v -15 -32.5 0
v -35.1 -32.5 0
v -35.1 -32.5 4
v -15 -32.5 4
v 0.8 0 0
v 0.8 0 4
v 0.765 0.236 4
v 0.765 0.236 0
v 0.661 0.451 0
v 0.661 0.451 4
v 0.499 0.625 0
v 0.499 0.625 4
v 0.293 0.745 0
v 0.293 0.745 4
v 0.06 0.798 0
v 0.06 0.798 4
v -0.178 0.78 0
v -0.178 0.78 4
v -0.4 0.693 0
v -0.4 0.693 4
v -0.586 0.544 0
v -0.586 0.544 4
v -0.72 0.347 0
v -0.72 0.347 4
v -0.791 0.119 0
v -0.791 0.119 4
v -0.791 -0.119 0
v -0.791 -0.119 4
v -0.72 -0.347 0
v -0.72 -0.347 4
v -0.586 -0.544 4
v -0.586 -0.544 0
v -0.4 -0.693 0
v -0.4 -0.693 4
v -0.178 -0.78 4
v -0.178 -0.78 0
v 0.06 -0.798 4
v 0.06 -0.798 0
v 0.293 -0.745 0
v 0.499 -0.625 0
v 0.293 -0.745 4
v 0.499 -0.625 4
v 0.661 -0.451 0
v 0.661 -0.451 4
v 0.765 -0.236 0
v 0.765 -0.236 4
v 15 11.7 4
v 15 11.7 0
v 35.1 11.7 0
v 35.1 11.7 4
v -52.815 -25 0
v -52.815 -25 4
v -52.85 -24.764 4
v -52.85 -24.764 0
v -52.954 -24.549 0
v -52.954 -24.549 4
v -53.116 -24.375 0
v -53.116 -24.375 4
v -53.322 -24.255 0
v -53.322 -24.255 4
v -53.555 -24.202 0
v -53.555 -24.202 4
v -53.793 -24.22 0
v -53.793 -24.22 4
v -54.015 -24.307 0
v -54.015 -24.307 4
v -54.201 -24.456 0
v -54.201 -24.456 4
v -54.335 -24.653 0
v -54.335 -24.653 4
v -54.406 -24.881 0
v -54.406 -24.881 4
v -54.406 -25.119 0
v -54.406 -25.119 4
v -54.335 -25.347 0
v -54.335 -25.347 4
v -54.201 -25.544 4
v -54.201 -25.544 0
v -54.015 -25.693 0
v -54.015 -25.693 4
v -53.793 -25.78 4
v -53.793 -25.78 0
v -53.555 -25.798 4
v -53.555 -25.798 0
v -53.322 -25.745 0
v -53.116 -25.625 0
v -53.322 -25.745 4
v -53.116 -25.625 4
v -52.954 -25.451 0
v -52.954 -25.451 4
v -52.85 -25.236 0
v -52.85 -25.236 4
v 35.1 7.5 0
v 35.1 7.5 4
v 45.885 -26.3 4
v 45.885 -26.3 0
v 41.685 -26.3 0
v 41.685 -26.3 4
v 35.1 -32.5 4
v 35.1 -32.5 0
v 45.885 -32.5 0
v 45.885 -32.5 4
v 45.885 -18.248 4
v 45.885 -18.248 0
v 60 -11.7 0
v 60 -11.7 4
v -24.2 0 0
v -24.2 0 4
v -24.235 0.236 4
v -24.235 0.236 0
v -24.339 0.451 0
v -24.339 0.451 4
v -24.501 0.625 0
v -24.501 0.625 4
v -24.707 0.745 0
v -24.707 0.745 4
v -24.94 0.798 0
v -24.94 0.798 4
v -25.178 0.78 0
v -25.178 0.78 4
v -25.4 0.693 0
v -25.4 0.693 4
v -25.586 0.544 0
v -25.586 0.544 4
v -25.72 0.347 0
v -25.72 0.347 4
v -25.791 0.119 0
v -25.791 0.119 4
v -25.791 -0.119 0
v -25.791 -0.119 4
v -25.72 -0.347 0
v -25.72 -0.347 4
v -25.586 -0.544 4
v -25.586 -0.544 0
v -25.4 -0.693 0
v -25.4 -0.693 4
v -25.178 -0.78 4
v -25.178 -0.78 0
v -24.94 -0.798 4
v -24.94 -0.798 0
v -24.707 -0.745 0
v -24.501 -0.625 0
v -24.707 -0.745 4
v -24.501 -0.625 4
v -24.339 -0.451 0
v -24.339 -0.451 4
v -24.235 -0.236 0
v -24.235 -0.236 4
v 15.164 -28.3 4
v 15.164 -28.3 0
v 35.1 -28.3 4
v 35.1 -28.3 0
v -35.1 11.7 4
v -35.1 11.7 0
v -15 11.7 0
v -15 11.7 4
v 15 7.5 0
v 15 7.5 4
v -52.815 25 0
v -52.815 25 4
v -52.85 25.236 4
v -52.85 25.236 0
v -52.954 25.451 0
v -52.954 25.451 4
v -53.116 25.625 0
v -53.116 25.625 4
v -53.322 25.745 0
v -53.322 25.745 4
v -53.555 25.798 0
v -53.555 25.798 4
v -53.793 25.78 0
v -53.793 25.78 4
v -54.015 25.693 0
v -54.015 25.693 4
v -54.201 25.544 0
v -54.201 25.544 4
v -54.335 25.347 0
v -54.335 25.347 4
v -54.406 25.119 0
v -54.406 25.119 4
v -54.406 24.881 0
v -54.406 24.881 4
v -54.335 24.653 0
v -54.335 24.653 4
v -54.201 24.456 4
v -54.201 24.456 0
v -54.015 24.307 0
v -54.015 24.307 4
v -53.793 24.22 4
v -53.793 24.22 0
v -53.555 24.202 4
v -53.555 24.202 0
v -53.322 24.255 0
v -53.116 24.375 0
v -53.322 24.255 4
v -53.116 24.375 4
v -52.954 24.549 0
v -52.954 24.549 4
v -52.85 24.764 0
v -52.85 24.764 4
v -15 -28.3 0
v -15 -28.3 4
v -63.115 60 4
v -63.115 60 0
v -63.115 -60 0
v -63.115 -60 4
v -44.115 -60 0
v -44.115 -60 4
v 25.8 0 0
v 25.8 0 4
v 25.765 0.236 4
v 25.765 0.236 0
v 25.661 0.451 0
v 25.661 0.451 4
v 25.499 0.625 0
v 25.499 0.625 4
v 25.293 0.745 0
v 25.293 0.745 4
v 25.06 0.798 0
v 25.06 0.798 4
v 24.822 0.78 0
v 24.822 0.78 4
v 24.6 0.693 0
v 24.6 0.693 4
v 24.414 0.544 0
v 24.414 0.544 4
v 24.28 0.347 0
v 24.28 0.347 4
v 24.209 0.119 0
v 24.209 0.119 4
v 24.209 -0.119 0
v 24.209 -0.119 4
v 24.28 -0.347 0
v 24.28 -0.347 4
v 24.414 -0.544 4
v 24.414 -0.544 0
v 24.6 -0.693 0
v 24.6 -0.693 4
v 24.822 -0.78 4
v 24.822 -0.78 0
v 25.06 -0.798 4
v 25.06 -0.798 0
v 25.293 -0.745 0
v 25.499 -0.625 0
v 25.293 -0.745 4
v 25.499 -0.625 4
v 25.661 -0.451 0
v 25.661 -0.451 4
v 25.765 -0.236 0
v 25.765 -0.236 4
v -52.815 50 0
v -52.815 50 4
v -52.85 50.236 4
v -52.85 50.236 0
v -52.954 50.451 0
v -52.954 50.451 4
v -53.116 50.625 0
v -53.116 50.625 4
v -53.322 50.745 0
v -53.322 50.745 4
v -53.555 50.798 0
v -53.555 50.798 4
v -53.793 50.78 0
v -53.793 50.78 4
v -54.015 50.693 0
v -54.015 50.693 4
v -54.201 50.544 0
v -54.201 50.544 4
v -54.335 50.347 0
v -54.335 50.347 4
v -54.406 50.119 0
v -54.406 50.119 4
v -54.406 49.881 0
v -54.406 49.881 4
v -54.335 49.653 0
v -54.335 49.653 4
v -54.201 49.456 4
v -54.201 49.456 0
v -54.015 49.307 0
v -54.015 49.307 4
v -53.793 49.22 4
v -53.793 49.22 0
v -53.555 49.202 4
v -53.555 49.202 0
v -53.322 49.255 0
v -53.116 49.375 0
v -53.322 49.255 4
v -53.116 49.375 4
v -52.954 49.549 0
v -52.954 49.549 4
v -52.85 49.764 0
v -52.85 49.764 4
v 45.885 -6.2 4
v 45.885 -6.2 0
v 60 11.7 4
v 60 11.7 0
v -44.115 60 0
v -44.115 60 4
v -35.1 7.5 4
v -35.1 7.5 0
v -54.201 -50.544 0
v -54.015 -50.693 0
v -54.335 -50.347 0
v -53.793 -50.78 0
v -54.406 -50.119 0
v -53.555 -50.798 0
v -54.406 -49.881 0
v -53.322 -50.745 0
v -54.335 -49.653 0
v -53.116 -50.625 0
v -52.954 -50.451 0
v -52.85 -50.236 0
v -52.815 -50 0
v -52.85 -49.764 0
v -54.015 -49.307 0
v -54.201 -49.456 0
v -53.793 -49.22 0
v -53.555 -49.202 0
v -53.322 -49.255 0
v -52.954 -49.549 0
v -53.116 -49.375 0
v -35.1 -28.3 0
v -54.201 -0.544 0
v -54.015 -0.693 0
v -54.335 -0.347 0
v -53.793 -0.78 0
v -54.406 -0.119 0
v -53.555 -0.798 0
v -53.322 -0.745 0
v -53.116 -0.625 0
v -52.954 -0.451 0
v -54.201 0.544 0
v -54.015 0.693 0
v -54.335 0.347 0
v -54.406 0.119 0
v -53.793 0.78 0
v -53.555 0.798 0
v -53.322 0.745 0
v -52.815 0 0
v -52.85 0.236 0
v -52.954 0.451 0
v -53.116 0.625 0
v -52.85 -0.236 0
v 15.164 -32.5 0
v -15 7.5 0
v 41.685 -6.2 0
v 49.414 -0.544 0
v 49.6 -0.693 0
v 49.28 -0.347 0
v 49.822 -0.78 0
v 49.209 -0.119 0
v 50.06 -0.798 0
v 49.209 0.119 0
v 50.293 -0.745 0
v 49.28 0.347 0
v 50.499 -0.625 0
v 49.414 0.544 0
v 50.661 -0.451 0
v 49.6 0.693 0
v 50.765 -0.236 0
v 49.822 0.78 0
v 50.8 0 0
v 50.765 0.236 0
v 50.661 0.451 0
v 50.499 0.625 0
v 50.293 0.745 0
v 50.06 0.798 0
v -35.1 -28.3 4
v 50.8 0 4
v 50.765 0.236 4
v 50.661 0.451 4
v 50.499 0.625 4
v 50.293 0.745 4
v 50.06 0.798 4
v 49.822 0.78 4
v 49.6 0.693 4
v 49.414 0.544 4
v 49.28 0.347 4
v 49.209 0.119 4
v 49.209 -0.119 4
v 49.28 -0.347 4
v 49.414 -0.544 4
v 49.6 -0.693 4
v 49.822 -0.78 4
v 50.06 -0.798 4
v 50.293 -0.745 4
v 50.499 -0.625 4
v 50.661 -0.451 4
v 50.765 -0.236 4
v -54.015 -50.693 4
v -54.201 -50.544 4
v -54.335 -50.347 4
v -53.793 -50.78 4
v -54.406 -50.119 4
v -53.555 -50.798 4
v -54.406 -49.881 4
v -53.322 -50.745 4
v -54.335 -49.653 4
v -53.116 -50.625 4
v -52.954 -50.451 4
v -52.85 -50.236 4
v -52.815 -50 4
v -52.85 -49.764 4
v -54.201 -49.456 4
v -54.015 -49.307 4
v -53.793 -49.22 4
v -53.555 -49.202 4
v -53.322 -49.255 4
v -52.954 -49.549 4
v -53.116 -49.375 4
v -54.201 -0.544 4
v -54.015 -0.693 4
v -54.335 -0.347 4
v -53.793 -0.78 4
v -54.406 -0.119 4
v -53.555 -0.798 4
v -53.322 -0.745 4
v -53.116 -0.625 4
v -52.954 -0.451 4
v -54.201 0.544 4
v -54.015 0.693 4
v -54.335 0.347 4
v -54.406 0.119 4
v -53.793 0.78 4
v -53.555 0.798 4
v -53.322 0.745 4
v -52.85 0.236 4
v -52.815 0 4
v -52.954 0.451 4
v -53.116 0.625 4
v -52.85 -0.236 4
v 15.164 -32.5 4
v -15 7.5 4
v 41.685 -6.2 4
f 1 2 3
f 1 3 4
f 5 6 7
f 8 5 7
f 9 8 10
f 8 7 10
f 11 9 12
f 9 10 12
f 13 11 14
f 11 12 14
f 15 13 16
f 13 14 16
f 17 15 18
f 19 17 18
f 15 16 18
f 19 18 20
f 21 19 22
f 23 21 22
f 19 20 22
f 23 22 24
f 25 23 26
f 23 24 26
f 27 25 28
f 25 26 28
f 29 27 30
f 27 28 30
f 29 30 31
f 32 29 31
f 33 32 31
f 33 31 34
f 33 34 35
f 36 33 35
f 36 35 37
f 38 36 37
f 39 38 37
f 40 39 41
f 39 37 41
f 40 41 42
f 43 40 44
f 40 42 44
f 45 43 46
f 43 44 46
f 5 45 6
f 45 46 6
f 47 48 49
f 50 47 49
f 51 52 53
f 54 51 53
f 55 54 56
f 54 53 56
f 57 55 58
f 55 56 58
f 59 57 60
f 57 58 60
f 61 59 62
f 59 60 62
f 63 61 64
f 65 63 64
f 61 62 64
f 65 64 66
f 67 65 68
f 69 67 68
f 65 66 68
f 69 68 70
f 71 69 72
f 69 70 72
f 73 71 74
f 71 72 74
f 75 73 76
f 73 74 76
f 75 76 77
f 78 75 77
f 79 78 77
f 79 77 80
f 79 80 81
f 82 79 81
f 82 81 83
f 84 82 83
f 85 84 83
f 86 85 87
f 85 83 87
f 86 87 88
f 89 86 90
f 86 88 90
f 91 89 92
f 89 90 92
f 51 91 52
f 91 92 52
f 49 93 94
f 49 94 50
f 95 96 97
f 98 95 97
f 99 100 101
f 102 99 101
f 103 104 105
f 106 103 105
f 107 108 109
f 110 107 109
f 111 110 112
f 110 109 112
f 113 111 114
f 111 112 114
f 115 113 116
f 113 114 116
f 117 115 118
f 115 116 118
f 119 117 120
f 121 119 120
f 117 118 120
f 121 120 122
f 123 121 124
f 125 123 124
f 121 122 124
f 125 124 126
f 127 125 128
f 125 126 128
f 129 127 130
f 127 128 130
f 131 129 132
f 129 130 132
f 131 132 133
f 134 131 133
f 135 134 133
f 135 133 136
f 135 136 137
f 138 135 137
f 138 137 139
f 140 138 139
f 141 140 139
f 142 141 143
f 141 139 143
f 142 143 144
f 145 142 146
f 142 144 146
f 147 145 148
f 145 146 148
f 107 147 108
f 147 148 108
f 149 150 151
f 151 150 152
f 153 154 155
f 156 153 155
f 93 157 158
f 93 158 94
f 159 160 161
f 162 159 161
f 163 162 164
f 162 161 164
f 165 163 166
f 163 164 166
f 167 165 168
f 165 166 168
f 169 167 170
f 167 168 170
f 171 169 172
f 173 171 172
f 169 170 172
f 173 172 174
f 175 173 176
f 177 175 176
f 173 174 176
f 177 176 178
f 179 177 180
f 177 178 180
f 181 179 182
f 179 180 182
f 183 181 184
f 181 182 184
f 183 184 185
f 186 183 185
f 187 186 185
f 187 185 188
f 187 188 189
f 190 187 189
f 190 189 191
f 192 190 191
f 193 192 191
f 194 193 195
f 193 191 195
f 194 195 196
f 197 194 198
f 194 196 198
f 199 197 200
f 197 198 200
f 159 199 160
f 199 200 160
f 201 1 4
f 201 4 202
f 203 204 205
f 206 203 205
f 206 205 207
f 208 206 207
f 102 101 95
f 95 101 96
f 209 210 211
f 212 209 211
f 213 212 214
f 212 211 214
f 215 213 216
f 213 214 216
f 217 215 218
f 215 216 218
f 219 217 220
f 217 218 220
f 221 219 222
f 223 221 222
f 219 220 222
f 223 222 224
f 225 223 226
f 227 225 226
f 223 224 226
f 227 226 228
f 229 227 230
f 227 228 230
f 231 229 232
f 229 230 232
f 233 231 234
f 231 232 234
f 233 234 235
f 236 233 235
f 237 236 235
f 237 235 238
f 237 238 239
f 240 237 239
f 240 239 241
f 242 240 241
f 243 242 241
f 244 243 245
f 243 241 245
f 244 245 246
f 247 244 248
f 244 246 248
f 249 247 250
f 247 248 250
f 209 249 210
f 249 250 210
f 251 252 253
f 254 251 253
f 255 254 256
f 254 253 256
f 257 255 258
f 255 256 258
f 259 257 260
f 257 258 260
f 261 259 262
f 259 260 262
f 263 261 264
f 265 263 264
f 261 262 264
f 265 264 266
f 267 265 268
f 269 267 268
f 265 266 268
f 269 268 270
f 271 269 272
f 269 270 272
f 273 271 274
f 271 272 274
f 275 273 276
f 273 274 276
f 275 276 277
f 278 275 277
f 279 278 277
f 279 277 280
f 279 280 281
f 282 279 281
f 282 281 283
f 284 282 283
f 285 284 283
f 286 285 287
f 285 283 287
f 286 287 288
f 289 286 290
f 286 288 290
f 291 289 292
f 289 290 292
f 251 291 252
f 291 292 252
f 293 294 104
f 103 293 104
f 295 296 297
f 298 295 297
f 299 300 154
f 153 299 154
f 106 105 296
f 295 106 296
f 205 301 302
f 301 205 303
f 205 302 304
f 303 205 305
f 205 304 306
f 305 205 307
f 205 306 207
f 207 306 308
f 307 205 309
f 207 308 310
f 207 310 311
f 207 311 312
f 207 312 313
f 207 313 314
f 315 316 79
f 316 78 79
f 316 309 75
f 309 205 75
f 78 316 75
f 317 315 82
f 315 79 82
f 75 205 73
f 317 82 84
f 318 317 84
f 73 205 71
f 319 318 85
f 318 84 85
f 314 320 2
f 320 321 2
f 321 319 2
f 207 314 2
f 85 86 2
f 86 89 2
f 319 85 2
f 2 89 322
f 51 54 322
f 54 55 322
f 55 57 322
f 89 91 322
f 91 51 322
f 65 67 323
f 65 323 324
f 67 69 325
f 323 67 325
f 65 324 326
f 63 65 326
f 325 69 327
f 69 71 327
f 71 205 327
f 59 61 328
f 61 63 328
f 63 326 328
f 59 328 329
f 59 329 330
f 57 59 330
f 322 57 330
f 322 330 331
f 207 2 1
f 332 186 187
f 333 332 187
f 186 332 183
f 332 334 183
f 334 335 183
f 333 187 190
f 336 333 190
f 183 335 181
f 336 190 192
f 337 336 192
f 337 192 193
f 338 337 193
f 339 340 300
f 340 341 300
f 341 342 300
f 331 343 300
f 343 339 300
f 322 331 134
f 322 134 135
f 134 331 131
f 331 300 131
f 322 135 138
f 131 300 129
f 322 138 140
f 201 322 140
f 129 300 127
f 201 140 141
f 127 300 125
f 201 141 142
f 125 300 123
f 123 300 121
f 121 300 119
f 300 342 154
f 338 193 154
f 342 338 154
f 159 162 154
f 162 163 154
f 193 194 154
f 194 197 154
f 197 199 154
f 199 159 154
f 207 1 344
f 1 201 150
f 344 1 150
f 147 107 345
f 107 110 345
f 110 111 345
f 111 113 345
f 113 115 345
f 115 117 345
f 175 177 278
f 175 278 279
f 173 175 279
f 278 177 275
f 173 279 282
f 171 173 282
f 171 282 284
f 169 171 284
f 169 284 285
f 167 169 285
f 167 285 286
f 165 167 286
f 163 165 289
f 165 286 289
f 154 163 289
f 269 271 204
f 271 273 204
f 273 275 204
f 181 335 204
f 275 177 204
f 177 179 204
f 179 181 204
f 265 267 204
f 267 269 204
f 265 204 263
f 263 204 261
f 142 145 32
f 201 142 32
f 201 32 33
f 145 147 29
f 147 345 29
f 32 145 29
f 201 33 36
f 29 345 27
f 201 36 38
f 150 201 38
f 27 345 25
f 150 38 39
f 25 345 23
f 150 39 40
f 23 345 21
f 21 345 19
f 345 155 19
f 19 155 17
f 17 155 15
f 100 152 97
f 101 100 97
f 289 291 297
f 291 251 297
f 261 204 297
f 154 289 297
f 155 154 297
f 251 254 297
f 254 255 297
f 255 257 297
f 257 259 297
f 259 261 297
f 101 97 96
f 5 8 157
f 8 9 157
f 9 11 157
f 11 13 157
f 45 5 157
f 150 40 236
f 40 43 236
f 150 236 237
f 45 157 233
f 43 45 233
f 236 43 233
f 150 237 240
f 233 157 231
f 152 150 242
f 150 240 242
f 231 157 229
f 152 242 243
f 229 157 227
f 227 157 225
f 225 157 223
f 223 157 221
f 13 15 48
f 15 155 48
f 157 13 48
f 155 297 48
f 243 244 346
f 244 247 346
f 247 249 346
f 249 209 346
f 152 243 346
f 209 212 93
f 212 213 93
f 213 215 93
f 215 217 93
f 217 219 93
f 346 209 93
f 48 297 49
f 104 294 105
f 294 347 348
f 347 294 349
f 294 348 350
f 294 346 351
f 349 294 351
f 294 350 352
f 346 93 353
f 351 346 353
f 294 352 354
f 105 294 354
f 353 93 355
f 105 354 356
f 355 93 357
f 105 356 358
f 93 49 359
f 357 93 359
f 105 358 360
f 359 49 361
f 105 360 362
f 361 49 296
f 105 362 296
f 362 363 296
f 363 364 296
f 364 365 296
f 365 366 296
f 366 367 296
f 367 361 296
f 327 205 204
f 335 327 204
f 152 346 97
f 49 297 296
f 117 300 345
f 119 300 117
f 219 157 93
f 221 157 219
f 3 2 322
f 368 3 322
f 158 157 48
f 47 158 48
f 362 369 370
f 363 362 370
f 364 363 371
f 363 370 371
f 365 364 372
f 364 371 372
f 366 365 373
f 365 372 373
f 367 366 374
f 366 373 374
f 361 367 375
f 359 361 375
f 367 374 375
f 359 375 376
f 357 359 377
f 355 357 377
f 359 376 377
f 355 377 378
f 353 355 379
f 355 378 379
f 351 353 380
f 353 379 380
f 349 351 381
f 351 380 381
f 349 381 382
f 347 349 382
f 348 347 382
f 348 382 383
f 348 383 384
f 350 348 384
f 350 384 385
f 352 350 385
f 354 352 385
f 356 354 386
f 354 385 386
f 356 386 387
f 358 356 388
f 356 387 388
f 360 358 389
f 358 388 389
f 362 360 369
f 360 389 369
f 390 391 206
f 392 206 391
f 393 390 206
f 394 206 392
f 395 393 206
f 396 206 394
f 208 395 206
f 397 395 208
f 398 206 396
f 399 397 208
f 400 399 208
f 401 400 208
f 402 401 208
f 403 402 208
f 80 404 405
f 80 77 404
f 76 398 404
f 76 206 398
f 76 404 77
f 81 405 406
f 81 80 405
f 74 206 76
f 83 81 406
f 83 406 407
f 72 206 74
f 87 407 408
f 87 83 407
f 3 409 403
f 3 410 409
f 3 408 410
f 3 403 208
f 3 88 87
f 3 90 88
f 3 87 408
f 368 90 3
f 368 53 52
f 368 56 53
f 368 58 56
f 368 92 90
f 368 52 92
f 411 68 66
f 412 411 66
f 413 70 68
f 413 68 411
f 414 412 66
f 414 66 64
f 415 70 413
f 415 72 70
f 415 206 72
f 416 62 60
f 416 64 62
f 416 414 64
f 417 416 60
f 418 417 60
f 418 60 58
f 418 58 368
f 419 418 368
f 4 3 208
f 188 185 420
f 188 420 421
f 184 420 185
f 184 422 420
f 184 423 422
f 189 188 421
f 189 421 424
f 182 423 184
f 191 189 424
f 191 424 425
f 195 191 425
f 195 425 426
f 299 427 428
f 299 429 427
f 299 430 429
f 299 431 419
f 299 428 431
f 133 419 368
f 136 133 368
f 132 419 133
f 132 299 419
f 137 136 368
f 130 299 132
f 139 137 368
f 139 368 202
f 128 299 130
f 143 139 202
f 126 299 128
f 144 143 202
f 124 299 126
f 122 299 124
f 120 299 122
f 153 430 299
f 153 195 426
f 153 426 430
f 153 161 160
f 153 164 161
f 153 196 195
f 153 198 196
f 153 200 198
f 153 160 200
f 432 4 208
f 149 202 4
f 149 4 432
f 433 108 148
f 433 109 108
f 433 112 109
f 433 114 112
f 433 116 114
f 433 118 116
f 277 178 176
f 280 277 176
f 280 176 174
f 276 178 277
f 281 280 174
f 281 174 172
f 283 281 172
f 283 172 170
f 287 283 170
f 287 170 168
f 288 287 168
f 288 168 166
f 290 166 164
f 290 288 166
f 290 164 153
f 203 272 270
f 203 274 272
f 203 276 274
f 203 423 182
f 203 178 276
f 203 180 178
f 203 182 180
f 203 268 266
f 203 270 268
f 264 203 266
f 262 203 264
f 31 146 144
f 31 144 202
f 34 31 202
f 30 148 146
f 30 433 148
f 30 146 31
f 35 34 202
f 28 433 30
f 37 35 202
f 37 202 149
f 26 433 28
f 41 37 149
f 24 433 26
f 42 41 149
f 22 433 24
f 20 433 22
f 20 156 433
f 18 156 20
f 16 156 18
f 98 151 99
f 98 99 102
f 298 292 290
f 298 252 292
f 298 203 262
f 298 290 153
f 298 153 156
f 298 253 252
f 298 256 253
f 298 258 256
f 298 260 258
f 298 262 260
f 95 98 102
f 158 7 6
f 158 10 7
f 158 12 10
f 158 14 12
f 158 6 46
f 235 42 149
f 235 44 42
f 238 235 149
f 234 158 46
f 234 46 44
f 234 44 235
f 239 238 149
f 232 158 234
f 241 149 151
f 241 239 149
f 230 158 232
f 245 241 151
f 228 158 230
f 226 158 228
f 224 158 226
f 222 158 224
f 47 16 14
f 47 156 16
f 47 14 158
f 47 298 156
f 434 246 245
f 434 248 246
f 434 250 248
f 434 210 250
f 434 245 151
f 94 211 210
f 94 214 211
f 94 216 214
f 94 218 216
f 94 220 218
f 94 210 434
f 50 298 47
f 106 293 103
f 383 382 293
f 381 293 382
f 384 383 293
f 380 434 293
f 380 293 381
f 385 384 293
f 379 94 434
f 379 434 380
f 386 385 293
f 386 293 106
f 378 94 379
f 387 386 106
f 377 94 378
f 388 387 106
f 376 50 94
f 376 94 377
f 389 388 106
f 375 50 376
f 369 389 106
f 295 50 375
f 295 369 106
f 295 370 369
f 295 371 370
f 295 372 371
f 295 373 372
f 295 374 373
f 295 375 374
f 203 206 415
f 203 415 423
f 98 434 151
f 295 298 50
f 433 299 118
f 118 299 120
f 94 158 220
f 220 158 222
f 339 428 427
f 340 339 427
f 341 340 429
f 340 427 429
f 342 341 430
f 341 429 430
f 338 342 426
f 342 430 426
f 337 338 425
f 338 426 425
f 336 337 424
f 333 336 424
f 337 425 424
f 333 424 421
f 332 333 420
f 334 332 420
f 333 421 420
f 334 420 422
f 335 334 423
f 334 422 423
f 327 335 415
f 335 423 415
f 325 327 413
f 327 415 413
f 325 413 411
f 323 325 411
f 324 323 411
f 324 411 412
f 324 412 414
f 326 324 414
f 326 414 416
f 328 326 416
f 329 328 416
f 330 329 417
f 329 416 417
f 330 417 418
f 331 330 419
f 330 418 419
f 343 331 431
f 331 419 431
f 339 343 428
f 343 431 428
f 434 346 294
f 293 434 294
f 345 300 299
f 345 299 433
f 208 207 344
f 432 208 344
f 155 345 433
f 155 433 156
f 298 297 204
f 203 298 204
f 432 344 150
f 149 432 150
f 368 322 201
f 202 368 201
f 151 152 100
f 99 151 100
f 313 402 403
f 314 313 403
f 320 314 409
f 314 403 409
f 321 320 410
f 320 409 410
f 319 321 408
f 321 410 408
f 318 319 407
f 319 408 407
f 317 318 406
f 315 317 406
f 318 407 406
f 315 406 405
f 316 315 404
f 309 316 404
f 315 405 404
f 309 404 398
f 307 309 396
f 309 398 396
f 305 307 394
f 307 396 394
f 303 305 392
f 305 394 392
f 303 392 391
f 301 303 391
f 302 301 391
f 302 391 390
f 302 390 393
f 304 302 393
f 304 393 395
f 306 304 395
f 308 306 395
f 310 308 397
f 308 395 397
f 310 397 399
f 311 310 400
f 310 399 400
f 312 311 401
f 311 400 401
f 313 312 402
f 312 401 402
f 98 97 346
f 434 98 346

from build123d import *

# Parameters (mm, degrees)
SKETCH1_W           = 20.1
SKETCH1_H           = 4.2
BOSS_EXTRUDE1_DEPTH = 4
SKETCH2_R           = 0.8
CUT_EXTRUDE1_DEPTH  = 4
SKETCH2_3_R         = 0.8
CUT_EXTRUDE2_DEPTH  = 4
LPATTERN1_COUNT     = 6
LPATTERN1_PITCH     = 25
LPATTERN2_COUNT     = 4
LPATTERN2_PITCH     = 25


with BuildPart() as part:
    # Sketch1 → Boss-Extrude1 (new body)
    with BuildSketch(Plane.XY):
        Polygon((-63.114700901, 60), (-63.114700901, -60), (-44.114700901, -60), (15.164047805, -32.5), (15.164047805, -28.3), (35.1, -28.3), (35.1, -32.5), (45.885299099, -32.5), (45.885299099, -26.3), (41.685299099, -26.3), (41.685299099, -6.2), (45.885299099, -6.2), (45.885299099, -8.64710736), (45.885299099, -18.248106547), (60.000337735, -11.7), (60.000337735, 11.7), (-44.114700901, 60), align=None)
        with Locations((-25.05, -30.4)):
            Rectangle(SKETCH1_W, SKETCH1_H, mode=Mode.SUBTRACT)
        with Locations((25.05, 9.6)):
            Rectangle(SKETCH1_W, SKETCH1_H, mode=Mode.SUBTRACT)
        with Locations((-25.05, 9.6)):
            Rectangle(SKETCH1_W, SKETCH1_H, mode=Mode.SUBTRACT)
    extrude(amount=BOSS_EXTRUDE1_DEPTH)

    # Sketch2 → Cut-Extrude1 (cut)
    with BuildSketch(Plane.XY.offset(4)):
        with Locations((-53.614700901, 50)):
            Circle(SKETCH2_R)
    cut_extrude1 = extrude(amount=-CUT_EXTRUDE1_DEPTH, mode=Mode.SUBTRACT)

    # Sketch2<3> → Cut-Extrude2 (cut)
    with BuildSketch(Plane.XY.offset(4)):
        with Locations((50.000337735, 0)):
            Circle(SKETCH2_3_R)
    cut_extrude2 = extrude(amount=-CUT_EXTRUDE2_DEPTH, mode=Mode.SUBTRACT)

    # LPattern1: Cut-Extrude1 ×6
    with Locations(*[(0, -i * LPATTERN1_PITCH, 0) for i in range(1, LPATTERN1_COUNT)]):
        add(cut_extrude1, mode=Mode.SUBTRACT)

    # LPattern2: Cut-Extrude2 ×4
    with Locations(*[(-i * LPATTERN2_PITCH, 0, 0) for i in range(1, LPATTERN2_COUNT)]):
        add(cut_extrude2, mode=Mode.SUBTRACT)


solid = part.part
